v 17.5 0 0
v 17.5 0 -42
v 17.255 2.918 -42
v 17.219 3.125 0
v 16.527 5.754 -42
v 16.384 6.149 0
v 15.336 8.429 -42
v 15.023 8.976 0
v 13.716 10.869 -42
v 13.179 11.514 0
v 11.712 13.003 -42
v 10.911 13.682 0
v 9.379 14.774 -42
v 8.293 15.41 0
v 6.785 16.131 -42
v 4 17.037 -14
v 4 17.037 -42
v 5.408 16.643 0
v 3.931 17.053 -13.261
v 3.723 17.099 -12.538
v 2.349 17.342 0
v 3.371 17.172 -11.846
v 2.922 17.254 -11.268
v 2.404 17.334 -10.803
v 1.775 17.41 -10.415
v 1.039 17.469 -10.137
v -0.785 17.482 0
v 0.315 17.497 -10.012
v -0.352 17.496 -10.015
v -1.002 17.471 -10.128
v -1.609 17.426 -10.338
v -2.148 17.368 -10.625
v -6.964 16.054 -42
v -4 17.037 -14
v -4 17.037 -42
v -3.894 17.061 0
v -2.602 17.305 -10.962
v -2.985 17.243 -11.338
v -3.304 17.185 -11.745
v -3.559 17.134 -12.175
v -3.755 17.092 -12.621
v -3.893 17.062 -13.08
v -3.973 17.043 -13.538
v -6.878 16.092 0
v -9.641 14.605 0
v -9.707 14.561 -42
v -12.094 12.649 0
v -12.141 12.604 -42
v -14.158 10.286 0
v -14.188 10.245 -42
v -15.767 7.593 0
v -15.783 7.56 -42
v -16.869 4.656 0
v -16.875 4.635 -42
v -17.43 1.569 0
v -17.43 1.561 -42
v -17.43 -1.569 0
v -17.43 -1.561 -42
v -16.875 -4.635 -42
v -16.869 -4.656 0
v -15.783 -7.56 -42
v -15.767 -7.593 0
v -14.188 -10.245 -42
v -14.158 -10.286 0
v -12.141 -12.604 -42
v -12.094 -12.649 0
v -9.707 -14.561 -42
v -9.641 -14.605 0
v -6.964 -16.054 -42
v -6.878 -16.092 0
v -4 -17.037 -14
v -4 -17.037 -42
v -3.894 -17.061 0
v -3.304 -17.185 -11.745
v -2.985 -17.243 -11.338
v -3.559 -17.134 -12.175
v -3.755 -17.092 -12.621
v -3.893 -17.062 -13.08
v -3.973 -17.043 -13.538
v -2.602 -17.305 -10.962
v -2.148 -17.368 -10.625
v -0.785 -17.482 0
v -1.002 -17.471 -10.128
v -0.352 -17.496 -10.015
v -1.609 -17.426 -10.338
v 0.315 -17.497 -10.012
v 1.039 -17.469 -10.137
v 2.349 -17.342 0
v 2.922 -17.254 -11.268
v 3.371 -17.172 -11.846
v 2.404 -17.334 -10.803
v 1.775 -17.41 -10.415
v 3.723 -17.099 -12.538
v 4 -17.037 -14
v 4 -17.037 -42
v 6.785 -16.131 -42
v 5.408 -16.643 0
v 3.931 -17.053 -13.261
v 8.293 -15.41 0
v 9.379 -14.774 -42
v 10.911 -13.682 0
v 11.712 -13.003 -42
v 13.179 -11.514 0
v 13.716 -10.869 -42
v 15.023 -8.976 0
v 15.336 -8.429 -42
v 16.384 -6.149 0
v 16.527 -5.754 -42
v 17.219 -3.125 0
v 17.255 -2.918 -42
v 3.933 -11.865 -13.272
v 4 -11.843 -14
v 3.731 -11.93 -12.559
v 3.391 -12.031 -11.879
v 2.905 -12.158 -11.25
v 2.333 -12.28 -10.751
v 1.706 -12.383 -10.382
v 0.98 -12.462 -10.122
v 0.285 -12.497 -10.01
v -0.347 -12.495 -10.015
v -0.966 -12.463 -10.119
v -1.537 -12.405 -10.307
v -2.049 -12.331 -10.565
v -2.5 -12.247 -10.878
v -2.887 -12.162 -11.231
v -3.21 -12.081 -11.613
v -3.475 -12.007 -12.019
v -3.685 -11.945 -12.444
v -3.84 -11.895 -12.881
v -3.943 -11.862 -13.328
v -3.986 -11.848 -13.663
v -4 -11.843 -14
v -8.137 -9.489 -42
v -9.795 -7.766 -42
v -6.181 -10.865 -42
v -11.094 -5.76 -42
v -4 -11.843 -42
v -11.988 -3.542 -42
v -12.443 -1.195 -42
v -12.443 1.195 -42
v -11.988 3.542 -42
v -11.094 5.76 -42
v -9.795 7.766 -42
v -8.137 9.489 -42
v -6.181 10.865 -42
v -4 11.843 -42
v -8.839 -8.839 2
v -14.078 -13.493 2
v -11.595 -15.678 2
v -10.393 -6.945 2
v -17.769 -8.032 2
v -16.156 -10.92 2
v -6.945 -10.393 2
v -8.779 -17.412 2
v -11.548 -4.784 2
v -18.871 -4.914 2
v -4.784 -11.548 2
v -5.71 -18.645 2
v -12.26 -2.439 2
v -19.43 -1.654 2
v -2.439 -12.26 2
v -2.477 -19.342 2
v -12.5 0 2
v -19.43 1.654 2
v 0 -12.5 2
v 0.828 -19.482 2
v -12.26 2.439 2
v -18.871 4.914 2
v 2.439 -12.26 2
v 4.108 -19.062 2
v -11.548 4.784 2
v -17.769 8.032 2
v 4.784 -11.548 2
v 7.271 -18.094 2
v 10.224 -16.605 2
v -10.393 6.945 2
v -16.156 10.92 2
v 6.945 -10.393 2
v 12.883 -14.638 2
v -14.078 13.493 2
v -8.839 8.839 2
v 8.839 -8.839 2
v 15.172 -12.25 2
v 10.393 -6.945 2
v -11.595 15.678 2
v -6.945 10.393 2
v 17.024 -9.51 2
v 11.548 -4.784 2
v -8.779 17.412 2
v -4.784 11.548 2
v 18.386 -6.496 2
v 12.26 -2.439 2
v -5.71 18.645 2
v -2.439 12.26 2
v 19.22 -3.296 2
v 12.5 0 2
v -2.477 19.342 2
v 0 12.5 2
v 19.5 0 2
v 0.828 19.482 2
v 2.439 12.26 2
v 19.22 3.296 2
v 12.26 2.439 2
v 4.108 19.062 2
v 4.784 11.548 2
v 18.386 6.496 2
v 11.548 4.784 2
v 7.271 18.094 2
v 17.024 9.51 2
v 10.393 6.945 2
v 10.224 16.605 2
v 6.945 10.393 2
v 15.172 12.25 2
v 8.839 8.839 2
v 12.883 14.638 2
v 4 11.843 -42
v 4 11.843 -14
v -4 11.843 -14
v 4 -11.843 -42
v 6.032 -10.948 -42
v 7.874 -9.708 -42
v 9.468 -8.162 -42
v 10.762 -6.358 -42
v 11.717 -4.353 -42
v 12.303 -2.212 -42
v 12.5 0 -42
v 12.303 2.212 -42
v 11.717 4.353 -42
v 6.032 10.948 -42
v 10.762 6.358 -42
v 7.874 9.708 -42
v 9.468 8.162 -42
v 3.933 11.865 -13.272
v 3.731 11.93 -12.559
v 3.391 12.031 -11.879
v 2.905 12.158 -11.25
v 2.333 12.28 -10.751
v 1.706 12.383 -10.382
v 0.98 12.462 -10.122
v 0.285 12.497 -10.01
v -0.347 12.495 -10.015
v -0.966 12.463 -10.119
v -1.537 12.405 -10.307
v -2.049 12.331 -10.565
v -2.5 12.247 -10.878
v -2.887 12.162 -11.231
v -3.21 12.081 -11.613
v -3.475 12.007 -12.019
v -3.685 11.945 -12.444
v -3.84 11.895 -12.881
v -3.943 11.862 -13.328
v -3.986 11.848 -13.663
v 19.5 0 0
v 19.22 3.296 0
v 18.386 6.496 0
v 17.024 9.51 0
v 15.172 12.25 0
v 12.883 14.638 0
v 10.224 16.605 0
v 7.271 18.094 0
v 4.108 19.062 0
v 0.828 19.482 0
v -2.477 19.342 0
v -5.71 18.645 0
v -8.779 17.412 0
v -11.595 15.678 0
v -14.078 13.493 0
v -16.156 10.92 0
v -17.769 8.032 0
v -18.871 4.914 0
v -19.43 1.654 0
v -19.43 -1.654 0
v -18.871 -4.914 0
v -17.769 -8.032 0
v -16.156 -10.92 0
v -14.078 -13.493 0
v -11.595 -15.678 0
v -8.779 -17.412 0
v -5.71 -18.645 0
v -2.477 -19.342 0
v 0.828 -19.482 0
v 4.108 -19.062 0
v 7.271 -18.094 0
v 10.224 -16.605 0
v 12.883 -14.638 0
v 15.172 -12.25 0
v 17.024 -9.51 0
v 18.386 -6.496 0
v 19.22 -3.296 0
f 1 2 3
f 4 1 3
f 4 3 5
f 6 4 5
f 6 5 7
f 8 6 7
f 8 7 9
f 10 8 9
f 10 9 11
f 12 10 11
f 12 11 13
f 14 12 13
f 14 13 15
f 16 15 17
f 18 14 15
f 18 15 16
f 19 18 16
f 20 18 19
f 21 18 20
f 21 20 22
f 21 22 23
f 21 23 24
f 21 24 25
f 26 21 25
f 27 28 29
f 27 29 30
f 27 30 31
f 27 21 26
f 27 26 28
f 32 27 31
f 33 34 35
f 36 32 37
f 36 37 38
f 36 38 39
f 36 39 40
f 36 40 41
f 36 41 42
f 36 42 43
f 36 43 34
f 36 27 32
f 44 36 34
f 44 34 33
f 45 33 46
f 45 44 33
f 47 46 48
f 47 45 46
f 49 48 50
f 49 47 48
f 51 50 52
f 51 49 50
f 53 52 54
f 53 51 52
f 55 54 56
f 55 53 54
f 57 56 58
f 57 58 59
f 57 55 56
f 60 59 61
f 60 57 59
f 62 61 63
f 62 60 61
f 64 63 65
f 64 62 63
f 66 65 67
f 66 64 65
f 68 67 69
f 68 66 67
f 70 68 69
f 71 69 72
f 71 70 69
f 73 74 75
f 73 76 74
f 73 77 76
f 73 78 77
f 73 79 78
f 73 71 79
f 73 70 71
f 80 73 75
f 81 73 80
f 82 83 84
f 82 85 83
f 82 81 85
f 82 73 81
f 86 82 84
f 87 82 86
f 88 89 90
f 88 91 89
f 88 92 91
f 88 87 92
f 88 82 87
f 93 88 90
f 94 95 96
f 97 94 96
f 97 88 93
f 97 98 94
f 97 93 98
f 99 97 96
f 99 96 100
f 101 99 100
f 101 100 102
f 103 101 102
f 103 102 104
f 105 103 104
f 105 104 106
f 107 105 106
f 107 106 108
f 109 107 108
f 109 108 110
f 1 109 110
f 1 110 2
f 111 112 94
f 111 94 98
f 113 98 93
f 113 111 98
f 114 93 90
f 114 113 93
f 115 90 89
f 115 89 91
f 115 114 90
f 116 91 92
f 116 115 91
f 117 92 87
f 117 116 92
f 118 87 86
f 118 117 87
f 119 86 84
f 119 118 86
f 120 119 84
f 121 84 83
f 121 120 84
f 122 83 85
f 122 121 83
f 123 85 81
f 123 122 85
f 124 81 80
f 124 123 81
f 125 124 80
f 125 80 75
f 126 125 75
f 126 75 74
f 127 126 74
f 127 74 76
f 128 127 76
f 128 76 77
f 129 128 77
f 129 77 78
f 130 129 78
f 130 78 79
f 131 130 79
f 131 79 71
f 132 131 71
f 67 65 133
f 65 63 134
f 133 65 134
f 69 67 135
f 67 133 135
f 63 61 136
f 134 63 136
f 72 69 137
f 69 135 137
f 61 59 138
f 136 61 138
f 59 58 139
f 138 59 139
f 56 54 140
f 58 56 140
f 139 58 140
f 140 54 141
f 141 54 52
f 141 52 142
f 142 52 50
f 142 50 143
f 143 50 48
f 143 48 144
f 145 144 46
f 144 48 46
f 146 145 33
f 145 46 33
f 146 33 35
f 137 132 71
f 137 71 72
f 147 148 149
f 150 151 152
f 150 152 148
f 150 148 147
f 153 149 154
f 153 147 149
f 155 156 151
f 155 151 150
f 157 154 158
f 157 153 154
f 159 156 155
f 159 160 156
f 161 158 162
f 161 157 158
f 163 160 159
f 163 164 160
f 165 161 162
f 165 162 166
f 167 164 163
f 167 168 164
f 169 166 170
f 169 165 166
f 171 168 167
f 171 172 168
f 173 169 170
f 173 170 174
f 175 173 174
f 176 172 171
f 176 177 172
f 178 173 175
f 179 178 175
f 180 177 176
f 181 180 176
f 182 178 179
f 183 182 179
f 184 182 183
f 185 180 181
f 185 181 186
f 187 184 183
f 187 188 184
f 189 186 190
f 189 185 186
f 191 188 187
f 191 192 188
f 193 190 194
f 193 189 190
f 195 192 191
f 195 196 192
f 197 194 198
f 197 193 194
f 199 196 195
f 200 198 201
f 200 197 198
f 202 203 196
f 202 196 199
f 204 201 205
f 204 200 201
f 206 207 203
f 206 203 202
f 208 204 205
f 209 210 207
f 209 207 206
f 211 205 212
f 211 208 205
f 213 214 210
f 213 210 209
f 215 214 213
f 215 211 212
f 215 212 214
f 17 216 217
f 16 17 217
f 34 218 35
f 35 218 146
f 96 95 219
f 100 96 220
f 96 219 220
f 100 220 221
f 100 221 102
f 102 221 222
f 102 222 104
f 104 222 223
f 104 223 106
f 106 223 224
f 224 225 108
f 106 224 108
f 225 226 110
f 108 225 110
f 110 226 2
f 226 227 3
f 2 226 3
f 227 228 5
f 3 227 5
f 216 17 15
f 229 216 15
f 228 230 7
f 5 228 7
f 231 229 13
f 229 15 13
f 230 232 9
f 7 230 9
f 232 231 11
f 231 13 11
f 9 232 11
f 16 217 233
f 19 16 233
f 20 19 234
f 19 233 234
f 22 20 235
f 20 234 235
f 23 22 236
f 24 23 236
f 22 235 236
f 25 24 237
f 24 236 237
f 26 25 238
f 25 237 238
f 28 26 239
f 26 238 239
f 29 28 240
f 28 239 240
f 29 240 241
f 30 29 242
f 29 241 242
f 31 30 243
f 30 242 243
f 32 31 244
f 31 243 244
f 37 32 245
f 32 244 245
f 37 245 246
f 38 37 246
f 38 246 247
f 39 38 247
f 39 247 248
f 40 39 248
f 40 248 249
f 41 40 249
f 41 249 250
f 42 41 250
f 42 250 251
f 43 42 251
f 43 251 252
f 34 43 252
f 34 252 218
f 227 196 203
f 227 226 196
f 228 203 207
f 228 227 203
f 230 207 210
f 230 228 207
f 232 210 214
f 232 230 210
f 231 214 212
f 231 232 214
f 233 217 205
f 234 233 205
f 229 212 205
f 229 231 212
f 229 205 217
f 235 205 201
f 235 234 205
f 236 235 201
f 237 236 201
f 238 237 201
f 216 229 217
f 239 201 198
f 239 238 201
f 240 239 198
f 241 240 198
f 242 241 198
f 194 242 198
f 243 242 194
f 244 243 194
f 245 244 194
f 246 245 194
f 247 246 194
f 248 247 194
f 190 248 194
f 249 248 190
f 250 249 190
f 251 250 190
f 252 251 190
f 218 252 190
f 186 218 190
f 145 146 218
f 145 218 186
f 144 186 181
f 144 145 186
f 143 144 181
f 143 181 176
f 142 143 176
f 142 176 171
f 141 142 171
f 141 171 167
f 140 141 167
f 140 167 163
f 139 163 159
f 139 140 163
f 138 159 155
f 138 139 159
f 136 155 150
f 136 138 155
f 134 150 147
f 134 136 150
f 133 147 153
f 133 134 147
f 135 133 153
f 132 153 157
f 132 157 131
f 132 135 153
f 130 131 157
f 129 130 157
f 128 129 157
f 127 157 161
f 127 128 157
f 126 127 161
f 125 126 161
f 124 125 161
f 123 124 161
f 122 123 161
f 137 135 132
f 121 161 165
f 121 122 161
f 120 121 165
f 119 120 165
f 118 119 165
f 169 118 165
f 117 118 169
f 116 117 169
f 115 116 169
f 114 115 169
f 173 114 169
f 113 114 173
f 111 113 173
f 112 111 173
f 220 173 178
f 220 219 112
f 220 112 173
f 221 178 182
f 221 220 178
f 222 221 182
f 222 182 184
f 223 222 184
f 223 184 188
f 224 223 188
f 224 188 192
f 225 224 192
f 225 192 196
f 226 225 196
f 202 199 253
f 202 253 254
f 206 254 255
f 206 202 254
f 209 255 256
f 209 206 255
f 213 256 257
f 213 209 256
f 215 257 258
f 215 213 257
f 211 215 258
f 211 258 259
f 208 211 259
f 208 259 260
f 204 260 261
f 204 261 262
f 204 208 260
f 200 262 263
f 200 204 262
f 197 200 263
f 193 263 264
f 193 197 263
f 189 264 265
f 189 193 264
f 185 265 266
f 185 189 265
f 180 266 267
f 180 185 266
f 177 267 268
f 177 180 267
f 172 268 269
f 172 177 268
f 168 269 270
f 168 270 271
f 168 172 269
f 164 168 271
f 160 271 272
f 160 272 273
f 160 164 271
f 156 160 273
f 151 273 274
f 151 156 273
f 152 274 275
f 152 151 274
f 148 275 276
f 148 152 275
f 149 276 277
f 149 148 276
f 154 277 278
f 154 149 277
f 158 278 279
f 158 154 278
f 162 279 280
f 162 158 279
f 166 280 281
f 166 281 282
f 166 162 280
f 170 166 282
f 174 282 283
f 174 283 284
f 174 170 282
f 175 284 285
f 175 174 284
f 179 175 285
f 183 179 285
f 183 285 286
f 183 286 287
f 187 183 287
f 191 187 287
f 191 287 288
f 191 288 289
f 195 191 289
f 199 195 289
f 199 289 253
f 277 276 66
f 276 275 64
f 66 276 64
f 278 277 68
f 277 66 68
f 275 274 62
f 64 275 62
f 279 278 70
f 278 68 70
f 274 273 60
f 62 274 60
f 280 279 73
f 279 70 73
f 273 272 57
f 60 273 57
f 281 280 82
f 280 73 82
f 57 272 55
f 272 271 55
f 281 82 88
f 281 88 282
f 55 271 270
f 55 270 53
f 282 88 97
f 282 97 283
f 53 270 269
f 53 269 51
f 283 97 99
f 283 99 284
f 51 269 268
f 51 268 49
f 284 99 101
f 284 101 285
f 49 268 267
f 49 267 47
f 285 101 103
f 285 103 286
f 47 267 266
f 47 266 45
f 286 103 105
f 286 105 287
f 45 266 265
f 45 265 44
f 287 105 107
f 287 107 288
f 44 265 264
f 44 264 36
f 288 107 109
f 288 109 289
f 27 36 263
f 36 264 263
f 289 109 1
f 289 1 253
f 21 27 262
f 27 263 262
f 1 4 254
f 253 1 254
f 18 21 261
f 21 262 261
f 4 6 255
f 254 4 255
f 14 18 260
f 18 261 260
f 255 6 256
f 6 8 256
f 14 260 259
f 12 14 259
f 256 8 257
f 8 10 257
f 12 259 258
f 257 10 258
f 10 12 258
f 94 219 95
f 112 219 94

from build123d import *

# Parameters (mm, degrees)
SKETCH_1_R               = 17.5
SKETCH_1_R_2             = 12.5
EXTRUDE_1_DEPTH          = 2
EXTRUDE_1_DEPTH_BACK     = 42
SKETCH_2_R               = 19.5
SKETCH_2_R_2             = 17.5
EXTRUDE_2_DEPTH          = 2
CUT_EXTRUDE_1_DEPTH      = 20.5
CUT_EXTRUDE_1_DEPTH_BACK = 20.5


with BuildPart() as part:
    # Эскиз1 → Бобышка-Вытянуть1 (new body, two sides)
    with BuildSketch(Plane.XY) as extrude_1_sk:
        Circle(SKETCH_1_R)
        Circle(SKETCH_1_R_2, mode=Mode.SUBTRACT)
    extrude(amount=EXTRUDE_1_DEPTH)
    extrude(extrude_1_sk.sketch, amount=-EXTRUDE_1_DEPTH_BACK)

    # Эскиз2 → Бобышка-Вытянуть2 (add)
    with BuildSketch(Plane.XY.offset(2)):
        Circle(SKETCH_2_R)
        Circle(SKETCH_2_R_2, mode=Mode.SUBTRACT)
    extrude(amount=-EXTRUDE_2_DEPTH)

    # Эскиз3 → Вырез-Вытянуть1 (cut, two sides)
    with BuildSketch(Plane(origin=(0, 0, 0), x_dir=(1, 0, 0), z_dir=(0, 1, 0))) as cut_extrude_1_sk:
        with BuildLine():
            Line((4, 42), (4, 14))
            ThreePointArc((4, 14), (0, 10), (-4, 14))
            Line((-4, 14), (-4, 42))
            ThreePointArc((-4, 42), (0, 46), (4, 42))
        make_face()
    extrude(amount=CUT_EXTRUDE_1_DEPTH, mode=Mode.SUBTRACT)
    extrude(cut_extrude_1_sk.sketch, amount=-CUT_EXTRUDE_1_DEPTH_BACK, mode=Mode.SUBTRACT)


solid = part.part
